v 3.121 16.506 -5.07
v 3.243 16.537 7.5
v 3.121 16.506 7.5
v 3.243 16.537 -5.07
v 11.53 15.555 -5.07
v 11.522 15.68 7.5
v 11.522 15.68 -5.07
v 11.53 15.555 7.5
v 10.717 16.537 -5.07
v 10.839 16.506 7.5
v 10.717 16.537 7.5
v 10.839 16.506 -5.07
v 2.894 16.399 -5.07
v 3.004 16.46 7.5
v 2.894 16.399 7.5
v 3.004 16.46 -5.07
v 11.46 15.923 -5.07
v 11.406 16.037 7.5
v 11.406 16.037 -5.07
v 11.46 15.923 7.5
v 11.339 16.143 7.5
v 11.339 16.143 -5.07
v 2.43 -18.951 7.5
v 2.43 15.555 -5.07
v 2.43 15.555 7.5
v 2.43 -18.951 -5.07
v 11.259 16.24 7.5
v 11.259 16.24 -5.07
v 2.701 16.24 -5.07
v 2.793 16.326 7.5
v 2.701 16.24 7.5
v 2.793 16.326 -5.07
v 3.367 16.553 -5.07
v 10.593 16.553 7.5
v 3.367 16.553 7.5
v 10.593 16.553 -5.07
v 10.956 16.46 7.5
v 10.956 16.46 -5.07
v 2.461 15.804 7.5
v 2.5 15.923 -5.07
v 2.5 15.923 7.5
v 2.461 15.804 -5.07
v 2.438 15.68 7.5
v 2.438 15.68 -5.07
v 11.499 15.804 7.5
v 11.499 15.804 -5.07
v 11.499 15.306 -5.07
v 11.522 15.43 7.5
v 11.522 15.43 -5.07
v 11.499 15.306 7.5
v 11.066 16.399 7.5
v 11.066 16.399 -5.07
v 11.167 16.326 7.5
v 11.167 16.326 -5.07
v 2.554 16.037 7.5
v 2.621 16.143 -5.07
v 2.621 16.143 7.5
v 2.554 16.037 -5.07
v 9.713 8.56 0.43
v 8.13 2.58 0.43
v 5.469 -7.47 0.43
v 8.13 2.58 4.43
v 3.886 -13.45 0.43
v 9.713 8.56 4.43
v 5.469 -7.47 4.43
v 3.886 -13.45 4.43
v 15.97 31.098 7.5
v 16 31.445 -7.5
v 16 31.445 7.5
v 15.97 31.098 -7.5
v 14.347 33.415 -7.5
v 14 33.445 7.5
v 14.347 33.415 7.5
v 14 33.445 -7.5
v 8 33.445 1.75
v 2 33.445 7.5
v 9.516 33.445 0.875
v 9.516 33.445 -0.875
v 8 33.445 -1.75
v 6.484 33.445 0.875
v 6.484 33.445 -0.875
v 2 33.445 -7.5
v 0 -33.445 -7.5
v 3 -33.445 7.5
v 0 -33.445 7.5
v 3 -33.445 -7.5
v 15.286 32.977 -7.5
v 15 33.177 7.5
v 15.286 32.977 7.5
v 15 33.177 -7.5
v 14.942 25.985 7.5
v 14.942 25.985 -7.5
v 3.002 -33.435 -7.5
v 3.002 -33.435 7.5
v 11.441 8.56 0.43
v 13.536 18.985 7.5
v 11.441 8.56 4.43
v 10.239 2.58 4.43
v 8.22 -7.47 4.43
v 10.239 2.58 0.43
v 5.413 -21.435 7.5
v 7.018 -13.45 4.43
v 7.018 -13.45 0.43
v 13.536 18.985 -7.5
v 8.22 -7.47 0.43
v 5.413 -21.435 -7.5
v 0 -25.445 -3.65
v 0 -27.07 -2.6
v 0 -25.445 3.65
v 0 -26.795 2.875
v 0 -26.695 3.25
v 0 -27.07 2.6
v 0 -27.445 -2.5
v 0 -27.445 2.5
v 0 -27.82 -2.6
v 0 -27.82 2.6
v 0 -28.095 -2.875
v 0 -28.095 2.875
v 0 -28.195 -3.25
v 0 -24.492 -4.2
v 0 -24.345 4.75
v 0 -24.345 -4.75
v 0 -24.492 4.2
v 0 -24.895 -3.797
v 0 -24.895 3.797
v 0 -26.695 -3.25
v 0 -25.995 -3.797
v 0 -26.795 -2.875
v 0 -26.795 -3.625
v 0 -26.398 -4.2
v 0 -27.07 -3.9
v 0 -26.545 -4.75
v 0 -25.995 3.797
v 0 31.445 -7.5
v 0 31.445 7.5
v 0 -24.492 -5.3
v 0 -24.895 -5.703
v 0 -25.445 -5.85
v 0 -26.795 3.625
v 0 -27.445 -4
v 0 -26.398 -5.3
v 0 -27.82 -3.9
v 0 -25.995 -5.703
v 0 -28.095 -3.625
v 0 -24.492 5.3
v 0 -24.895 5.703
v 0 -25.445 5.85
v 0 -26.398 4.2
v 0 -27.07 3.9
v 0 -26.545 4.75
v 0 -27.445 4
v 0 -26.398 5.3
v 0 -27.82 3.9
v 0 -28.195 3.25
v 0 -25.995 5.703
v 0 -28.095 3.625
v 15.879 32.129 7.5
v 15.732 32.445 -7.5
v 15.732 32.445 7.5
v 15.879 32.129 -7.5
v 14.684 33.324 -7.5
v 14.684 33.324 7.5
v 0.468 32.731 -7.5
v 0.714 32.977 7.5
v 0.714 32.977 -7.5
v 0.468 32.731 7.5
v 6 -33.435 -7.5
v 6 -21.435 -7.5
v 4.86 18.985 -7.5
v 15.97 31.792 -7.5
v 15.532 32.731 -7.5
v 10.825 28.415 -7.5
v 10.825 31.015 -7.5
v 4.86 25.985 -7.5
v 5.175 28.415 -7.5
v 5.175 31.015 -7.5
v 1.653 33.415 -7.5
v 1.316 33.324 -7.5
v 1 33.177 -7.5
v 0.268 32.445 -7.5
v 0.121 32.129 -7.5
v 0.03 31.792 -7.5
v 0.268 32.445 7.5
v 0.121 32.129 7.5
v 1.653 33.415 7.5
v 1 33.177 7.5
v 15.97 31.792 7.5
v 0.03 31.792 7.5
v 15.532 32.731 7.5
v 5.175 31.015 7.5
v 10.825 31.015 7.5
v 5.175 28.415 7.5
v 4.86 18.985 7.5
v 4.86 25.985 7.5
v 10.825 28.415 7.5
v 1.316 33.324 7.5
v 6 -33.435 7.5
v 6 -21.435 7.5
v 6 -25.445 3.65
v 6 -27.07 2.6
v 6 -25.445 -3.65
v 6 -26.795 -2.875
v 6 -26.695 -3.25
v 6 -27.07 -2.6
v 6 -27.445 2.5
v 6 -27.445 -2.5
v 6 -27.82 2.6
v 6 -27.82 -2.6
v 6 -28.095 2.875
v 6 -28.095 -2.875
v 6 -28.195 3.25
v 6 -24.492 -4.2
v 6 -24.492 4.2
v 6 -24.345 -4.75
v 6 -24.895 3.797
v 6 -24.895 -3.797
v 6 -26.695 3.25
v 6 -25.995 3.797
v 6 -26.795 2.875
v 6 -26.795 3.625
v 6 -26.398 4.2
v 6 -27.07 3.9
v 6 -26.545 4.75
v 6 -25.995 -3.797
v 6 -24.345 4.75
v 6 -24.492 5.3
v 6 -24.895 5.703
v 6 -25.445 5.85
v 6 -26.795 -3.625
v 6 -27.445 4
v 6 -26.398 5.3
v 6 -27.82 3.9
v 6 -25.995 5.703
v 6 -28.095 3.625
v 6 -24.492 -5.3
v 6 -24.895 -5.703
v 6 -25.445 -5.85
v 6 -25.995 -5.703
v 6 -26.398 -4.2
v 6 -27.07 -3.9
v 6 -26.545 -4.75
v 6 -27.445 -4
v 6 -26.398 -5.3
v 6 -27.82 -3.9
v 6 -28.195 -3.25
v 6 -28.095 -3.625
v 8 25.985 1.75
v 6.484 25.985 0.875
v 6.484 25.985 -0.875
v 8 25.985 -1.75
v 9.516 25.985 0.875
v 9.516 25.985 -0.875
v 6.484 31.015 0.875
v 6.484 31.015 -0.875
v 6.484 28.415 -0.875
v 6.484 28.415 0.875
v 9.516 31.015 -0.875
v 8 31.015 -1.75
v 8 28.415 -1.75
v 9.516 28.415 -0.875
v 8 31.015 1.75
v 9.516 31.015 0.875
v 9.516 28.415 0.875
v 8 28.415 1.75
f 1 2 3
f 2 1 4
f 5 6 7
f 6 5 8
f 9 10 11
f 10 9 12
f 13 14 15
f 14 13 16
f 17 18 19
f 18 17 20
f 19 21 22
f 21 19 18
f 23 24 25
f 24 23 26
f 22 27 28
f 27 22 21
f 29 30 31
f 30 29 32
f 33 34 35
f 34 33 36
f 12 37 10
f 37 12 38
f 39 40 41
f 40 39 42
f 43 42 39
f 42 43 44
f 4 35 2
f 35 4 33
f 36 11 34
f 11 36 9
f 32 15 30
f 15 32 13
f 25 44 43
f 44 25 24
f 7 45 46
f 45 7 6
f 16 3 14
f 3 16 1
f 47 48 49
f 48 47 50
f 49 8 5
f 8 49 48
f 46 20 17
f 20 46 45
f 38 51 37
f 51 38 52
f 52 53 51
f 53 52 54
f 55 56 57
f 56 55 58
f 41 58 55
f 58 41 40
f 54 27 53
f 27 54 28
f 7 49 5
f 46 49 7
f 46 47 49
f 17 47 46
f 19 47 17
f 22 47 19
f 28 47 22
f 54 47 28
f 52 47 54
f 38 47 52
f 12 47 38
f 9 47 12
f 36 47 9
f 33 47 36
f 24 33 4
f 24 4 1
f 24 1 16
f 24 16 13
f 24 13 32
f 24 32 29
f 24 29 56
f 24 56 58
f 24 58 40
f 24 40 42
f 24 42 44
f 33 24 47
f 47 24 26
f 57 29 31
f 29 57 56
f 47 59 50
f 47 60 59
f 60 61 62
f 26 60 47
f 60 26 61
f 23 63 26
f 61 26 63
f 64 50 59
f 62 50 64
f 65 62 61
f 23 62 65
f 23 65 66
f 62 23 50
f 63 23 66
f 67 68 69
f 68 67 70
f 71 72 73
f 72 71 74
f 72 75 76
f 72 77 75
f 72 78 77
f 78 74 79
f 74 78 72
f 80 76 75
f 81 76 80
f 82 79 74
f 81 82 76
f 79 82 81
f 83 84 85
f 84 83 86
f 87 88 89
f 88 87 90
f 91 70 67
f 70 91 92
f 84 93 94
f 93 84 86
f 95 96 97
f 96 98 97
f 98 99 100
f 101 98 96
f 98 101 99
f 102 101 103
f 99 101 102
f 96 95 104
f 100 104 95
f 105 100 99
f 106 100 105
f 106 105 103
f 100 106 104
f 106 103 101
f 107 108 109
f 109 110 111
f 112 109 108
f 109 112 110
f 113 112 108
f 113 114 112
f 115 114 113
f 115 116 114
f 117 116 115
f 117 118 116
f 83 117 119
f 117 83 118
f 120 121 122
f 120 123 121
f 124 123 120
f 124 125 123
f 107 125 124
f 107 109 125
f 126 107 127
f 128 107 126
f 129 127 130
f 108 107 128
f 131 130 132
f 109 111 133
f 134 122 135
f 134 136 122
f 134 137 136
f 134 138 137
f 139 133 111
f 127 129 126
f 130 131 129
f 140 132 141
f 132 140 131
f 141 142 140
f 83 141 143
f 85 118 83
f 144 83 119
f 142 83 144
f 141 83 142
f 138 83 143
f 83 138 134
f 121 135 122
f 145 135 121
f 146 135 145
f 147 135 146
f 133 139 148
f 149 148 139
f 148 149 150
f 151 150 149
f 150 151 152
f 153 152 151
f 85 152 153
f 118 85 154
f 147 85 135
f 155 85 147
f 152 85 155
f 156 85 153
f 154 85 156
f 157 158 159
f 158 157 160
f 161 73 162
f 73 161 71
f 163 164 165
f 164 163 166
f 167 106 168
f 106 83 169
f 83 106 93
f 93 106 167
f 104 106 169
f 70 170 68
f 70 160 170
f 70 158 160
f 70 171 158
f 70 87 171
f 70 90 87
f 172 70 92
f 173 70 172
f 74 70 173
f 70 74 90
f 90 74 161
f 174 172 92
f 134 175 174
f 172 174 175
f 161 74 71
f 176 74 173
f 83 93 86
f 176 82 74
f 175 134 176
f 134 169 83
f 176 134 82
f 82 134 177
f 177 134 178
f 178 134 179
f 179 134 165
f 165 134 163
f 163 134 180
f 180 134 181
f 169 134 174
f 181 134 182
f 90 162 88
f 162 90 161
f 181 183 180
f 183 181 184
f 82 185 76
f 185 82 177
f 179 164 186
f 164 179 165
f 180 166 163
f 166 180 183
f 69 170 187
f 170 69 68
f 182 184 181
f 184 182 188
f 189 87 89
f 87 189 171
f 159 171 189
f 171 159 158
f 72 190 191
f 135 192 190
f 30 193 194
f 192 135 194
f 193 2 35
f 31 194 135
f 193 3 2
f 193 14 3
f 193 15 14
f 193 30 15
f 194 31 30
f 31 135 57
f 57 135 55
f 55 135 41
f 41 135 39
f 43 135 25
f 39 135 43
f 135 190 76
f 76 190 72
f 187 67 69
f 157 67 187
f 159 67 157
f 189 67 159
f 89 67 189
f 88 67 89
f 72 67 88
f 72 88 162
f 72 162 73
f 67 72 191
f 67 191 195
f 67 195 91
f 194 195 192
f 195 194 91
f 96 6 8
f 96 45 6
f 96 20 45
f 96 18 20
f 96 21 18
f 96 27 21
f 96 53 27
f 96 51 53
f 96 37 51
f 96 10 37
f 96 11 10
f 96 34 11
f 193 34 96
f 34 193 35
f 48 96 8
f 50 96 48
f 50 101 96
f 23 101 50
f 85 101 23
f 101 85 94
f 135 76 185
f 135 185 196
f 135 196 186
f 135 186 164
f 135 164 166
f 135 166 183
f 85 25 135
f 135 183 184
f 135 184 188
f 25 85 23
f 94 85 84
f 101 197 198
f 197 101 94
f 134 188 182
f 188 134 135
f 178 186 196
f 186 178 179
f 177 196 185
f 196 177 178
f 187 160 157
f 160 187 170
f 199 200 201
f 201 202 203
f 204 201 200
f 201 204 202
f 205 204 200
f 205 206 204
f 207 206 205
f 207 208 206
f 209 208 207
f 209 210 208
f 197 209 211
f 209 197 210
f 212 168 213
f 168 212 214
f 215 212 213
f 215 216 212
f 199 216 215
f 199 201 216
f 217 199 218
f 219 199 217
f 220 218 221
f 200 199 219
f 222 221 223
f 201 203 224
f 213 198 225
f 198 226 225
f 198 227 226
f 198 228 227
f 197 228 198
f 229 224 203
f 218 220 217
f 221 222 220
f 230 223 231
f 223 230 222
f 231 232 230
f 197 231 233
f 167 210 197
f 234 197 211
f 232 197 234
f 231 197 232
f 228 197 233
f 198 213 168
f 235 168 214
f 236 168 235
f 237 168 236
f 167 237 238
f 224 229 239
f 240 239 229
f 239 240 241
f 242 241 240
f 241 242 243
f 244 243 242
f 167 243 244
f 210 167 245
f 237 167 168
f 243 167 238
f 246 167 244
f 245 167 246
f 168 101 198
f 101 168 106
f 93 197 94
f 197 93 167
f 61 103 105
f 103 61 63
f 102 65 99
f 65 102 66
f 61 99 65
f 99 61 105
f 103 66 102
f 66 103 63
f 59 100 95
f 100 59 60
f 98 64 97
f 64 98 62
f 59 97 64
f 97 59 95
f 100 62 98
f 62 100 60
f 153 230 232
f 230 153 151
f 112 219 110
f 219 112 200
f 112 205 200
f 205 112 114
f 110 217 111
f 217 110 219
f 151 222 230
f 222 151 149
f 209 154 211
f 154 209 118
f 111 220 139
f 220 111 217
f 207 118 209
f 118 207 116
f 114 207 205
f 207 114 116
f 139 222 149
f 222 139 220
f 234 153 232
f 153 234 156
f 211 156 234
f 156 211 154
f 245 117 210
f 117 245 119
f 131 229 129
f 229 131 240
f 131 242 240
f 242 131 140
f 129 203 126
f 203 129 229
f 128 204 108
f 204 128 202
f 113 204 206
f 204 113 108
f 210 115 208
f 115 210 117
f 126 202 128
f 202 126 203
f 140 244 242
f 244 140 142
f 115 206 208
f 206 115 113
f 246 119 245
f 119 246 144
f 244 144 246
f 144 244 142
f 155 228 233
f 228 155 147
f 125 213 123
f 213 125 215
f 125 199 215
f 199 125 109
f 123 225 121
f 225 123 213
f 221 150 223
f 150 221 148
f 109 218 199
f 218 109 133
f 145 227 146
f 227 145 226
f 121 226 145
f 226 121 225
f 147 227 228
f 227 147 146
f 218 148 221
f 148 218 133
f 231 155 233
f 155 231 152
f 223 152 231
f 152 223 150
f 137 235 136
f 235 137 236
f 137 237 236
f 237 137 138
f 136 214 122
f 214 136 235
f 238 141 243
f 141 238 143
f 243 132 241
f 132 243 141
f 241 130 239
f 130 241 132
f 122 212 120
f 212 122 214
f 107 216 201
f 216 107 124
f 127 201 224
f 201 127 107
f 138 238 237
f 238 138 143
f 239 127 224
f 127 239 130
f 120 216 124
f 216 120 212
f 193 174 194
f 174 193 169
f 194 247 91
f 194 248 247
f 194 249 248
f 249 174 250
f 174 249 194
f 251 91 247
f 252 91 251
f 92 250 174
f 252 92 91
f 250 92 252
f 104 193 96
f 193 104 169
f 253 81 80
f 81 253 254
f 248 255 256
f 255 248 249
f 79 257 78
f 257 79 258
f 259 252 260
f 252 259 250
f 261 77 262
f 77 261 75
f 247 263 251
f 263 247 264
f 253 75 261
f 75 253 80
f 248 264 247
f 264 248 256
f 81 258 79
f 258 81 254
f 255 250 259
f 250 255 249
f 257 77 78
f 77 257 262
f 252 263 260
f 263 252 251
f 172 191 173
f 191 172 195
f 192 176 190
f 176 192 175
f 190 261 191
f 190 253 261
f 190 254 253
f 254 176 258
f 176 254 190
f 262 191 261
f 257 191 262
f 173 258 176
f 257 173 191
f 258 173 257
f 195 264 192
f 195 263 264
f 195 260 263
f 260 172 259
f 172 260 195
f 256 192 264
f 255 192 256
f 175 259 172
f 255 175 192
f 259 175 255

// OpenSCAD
// Semi-automatic Microswitch Probe
// Design by Marius Gheorghescu, 2014-2017

// width of the probe
width = 15; 

// length of the clip
clip_len = 16;

// opening of the clip (thickness of the part the probe attaches to)
clip_gap = 7.0;

// length of the probe
base_to_tip = 50;


/* [Hidden] */

// thickness of the microswitch block (offset of the microswitch)
microswitch_thread_depth = 6;

// height of the microswitch block
microswitch_height = 12;

wall_thickness = 0.405*6;

microswitch_width = max(width, 14);

upper_area = 3*wall_thickness + clip_gap + 2.6 /* Wall + M3 nut + Wall + gap + Wall*/;
probe_len = base_to_tip + upper_area;

echo("clip length:", upper_area);
echo("probe total length:", probe_len);

epsilon = 0.01;

module switch_clip() {

	inner_triangle_height = probe_len - upper_area - 2*wall_thickness - 20;

    difference() {
        union() {

            difference() {
                triangle(probe_len, clip_len, width);
                
                // save material & increase strength
                rotate([0, 90, 0])
                translate([0,0,-wall_thickness])
                intersection() {
                    hull() {
                        rad = 1;
                        $fn = 50;

                        translate([-rad - wall_thickness, probe_len/2 - rad - upper_area, 0])
                            cylinder(r=rad, h=width, center=true);

                        translate([-rad + wall_thickness - base_to_tip/probe_len*clip_len, probe_len/2 - rad - upper_area, 0])
                            cylinder(r=rad, h=width, center=true);

                        translate([-rad - wall_thickness, -probe_len/2 + rad + microswitch_height, 0])
                            cylinder(r=rad, h=width, center=true);
                    }
                    
                    hull() {
                        rad = 1;
                        $fn = 50;

                        translate([-rad - wall_thickness, probe_len/2 - rad - upper_area, 0])
                            cylinder(r=rad, h=width, center=true);

                        translate([-rad + wall_thickness - base_to_tip/probe_len*clip_len, probe_len/2 - rad - upper_area, 0])
                            cylinder(r=rad, h=width, center=true);

                        translate([-rad, -probe_len/2 + rad + microswitch_height, 0])                    
                            cylinder(r=rad, h=width, center=true);
                    }
                }
                
            }

            // microswitch attach
            translate([-microswitch_width/2 + width/2, -probe_len/2 + microswitch_height/2 + epsilon, microswitch_thread_depth/2])
                cube([microswitch_width, microswitch_height, microswitch_thread_depth], center=true);
        }

        // grip / cut-out
        translate([0, probe_len/2 - clip_gap/2 - 2*wall_thickness - 2.6, clip_len/2 + 2*wall_thickness])
            cube([width + epsilon, clip_gap, clip_len], center=true);

        // attach M3 screw
        translate([0, probe_len/2, clip_len/2])
            rotate([90, 0, 0])
            cylinder(r=3.5/2, h=clip_gap + 10, center=true);

        // attach m3 nut
        translate([0, probe_len/2 - 2.6/2 - wall_thickness , clip_len/2])
                cube([width + epsilon, 2.6, 5.65], center=true);

        // cable cutouts
        translate([- wall_thickness, (microswitch_height - upper_area)/2, clip_len/2 + wall_thickness])
        scale([1, base_to_tip/probe_len,1])
        {
            translate([0, -probe_len/4 + 6, 0])
                cube([4, 8, clip_len], center=true);

            translate([0, probe_len/4 - 6, 0])
                cube([4, 8, clip_len], center=true);
        }

        // m1.5 screws for 16mm microswitch
        translate([-microswitch_width/2 + width/2, -probe_len/2 + 6, 3]) {
        
            translate([-6.5/2, 0, 0])
                cylinder(r=0.75, h=20, center=true, $fn=12);

            translate([6.5/2, 0, 0])
                cylinder(r=0.75, h=20, center=true, $fn=12);		
        }

        // m2 screws for 20mm microswitch
        translate([-microswitch_width/2 + width/2, -probe_len/2 + 8, 3]) {
        
            translate([-9.5/2, 0, 0])
                cylinder(r=1.1, h=20, center=true, $fn=12);

            translate([+9.5/2, 0, 0])
                cylinder(r=1.1, h=20, center=true, $fn=12);		
        }


    }
}

module triangle(probe_len, clip_len, width)
{
	bottom = microswitch_thread_depth/2;
	$fn = 36;
	rad = 2;

	rotate([0, 90, 0])
	hull() {

		translate([-rad, probe_len/2 - rad, 0])
			cylinder(r=rad, h=width, center=true);

		translate([-clip_len + rad, probe_len/2 - rad, 0])
			cylinder(r=rad, h=width, center=true);

		translate([-bottom/2, -probe_len/2 + 1/2, 0])
			cube([bottom, 1, width], center=true);
	}

}


rotate([0, 90, 0]) 
{
	switch_clip();
}
